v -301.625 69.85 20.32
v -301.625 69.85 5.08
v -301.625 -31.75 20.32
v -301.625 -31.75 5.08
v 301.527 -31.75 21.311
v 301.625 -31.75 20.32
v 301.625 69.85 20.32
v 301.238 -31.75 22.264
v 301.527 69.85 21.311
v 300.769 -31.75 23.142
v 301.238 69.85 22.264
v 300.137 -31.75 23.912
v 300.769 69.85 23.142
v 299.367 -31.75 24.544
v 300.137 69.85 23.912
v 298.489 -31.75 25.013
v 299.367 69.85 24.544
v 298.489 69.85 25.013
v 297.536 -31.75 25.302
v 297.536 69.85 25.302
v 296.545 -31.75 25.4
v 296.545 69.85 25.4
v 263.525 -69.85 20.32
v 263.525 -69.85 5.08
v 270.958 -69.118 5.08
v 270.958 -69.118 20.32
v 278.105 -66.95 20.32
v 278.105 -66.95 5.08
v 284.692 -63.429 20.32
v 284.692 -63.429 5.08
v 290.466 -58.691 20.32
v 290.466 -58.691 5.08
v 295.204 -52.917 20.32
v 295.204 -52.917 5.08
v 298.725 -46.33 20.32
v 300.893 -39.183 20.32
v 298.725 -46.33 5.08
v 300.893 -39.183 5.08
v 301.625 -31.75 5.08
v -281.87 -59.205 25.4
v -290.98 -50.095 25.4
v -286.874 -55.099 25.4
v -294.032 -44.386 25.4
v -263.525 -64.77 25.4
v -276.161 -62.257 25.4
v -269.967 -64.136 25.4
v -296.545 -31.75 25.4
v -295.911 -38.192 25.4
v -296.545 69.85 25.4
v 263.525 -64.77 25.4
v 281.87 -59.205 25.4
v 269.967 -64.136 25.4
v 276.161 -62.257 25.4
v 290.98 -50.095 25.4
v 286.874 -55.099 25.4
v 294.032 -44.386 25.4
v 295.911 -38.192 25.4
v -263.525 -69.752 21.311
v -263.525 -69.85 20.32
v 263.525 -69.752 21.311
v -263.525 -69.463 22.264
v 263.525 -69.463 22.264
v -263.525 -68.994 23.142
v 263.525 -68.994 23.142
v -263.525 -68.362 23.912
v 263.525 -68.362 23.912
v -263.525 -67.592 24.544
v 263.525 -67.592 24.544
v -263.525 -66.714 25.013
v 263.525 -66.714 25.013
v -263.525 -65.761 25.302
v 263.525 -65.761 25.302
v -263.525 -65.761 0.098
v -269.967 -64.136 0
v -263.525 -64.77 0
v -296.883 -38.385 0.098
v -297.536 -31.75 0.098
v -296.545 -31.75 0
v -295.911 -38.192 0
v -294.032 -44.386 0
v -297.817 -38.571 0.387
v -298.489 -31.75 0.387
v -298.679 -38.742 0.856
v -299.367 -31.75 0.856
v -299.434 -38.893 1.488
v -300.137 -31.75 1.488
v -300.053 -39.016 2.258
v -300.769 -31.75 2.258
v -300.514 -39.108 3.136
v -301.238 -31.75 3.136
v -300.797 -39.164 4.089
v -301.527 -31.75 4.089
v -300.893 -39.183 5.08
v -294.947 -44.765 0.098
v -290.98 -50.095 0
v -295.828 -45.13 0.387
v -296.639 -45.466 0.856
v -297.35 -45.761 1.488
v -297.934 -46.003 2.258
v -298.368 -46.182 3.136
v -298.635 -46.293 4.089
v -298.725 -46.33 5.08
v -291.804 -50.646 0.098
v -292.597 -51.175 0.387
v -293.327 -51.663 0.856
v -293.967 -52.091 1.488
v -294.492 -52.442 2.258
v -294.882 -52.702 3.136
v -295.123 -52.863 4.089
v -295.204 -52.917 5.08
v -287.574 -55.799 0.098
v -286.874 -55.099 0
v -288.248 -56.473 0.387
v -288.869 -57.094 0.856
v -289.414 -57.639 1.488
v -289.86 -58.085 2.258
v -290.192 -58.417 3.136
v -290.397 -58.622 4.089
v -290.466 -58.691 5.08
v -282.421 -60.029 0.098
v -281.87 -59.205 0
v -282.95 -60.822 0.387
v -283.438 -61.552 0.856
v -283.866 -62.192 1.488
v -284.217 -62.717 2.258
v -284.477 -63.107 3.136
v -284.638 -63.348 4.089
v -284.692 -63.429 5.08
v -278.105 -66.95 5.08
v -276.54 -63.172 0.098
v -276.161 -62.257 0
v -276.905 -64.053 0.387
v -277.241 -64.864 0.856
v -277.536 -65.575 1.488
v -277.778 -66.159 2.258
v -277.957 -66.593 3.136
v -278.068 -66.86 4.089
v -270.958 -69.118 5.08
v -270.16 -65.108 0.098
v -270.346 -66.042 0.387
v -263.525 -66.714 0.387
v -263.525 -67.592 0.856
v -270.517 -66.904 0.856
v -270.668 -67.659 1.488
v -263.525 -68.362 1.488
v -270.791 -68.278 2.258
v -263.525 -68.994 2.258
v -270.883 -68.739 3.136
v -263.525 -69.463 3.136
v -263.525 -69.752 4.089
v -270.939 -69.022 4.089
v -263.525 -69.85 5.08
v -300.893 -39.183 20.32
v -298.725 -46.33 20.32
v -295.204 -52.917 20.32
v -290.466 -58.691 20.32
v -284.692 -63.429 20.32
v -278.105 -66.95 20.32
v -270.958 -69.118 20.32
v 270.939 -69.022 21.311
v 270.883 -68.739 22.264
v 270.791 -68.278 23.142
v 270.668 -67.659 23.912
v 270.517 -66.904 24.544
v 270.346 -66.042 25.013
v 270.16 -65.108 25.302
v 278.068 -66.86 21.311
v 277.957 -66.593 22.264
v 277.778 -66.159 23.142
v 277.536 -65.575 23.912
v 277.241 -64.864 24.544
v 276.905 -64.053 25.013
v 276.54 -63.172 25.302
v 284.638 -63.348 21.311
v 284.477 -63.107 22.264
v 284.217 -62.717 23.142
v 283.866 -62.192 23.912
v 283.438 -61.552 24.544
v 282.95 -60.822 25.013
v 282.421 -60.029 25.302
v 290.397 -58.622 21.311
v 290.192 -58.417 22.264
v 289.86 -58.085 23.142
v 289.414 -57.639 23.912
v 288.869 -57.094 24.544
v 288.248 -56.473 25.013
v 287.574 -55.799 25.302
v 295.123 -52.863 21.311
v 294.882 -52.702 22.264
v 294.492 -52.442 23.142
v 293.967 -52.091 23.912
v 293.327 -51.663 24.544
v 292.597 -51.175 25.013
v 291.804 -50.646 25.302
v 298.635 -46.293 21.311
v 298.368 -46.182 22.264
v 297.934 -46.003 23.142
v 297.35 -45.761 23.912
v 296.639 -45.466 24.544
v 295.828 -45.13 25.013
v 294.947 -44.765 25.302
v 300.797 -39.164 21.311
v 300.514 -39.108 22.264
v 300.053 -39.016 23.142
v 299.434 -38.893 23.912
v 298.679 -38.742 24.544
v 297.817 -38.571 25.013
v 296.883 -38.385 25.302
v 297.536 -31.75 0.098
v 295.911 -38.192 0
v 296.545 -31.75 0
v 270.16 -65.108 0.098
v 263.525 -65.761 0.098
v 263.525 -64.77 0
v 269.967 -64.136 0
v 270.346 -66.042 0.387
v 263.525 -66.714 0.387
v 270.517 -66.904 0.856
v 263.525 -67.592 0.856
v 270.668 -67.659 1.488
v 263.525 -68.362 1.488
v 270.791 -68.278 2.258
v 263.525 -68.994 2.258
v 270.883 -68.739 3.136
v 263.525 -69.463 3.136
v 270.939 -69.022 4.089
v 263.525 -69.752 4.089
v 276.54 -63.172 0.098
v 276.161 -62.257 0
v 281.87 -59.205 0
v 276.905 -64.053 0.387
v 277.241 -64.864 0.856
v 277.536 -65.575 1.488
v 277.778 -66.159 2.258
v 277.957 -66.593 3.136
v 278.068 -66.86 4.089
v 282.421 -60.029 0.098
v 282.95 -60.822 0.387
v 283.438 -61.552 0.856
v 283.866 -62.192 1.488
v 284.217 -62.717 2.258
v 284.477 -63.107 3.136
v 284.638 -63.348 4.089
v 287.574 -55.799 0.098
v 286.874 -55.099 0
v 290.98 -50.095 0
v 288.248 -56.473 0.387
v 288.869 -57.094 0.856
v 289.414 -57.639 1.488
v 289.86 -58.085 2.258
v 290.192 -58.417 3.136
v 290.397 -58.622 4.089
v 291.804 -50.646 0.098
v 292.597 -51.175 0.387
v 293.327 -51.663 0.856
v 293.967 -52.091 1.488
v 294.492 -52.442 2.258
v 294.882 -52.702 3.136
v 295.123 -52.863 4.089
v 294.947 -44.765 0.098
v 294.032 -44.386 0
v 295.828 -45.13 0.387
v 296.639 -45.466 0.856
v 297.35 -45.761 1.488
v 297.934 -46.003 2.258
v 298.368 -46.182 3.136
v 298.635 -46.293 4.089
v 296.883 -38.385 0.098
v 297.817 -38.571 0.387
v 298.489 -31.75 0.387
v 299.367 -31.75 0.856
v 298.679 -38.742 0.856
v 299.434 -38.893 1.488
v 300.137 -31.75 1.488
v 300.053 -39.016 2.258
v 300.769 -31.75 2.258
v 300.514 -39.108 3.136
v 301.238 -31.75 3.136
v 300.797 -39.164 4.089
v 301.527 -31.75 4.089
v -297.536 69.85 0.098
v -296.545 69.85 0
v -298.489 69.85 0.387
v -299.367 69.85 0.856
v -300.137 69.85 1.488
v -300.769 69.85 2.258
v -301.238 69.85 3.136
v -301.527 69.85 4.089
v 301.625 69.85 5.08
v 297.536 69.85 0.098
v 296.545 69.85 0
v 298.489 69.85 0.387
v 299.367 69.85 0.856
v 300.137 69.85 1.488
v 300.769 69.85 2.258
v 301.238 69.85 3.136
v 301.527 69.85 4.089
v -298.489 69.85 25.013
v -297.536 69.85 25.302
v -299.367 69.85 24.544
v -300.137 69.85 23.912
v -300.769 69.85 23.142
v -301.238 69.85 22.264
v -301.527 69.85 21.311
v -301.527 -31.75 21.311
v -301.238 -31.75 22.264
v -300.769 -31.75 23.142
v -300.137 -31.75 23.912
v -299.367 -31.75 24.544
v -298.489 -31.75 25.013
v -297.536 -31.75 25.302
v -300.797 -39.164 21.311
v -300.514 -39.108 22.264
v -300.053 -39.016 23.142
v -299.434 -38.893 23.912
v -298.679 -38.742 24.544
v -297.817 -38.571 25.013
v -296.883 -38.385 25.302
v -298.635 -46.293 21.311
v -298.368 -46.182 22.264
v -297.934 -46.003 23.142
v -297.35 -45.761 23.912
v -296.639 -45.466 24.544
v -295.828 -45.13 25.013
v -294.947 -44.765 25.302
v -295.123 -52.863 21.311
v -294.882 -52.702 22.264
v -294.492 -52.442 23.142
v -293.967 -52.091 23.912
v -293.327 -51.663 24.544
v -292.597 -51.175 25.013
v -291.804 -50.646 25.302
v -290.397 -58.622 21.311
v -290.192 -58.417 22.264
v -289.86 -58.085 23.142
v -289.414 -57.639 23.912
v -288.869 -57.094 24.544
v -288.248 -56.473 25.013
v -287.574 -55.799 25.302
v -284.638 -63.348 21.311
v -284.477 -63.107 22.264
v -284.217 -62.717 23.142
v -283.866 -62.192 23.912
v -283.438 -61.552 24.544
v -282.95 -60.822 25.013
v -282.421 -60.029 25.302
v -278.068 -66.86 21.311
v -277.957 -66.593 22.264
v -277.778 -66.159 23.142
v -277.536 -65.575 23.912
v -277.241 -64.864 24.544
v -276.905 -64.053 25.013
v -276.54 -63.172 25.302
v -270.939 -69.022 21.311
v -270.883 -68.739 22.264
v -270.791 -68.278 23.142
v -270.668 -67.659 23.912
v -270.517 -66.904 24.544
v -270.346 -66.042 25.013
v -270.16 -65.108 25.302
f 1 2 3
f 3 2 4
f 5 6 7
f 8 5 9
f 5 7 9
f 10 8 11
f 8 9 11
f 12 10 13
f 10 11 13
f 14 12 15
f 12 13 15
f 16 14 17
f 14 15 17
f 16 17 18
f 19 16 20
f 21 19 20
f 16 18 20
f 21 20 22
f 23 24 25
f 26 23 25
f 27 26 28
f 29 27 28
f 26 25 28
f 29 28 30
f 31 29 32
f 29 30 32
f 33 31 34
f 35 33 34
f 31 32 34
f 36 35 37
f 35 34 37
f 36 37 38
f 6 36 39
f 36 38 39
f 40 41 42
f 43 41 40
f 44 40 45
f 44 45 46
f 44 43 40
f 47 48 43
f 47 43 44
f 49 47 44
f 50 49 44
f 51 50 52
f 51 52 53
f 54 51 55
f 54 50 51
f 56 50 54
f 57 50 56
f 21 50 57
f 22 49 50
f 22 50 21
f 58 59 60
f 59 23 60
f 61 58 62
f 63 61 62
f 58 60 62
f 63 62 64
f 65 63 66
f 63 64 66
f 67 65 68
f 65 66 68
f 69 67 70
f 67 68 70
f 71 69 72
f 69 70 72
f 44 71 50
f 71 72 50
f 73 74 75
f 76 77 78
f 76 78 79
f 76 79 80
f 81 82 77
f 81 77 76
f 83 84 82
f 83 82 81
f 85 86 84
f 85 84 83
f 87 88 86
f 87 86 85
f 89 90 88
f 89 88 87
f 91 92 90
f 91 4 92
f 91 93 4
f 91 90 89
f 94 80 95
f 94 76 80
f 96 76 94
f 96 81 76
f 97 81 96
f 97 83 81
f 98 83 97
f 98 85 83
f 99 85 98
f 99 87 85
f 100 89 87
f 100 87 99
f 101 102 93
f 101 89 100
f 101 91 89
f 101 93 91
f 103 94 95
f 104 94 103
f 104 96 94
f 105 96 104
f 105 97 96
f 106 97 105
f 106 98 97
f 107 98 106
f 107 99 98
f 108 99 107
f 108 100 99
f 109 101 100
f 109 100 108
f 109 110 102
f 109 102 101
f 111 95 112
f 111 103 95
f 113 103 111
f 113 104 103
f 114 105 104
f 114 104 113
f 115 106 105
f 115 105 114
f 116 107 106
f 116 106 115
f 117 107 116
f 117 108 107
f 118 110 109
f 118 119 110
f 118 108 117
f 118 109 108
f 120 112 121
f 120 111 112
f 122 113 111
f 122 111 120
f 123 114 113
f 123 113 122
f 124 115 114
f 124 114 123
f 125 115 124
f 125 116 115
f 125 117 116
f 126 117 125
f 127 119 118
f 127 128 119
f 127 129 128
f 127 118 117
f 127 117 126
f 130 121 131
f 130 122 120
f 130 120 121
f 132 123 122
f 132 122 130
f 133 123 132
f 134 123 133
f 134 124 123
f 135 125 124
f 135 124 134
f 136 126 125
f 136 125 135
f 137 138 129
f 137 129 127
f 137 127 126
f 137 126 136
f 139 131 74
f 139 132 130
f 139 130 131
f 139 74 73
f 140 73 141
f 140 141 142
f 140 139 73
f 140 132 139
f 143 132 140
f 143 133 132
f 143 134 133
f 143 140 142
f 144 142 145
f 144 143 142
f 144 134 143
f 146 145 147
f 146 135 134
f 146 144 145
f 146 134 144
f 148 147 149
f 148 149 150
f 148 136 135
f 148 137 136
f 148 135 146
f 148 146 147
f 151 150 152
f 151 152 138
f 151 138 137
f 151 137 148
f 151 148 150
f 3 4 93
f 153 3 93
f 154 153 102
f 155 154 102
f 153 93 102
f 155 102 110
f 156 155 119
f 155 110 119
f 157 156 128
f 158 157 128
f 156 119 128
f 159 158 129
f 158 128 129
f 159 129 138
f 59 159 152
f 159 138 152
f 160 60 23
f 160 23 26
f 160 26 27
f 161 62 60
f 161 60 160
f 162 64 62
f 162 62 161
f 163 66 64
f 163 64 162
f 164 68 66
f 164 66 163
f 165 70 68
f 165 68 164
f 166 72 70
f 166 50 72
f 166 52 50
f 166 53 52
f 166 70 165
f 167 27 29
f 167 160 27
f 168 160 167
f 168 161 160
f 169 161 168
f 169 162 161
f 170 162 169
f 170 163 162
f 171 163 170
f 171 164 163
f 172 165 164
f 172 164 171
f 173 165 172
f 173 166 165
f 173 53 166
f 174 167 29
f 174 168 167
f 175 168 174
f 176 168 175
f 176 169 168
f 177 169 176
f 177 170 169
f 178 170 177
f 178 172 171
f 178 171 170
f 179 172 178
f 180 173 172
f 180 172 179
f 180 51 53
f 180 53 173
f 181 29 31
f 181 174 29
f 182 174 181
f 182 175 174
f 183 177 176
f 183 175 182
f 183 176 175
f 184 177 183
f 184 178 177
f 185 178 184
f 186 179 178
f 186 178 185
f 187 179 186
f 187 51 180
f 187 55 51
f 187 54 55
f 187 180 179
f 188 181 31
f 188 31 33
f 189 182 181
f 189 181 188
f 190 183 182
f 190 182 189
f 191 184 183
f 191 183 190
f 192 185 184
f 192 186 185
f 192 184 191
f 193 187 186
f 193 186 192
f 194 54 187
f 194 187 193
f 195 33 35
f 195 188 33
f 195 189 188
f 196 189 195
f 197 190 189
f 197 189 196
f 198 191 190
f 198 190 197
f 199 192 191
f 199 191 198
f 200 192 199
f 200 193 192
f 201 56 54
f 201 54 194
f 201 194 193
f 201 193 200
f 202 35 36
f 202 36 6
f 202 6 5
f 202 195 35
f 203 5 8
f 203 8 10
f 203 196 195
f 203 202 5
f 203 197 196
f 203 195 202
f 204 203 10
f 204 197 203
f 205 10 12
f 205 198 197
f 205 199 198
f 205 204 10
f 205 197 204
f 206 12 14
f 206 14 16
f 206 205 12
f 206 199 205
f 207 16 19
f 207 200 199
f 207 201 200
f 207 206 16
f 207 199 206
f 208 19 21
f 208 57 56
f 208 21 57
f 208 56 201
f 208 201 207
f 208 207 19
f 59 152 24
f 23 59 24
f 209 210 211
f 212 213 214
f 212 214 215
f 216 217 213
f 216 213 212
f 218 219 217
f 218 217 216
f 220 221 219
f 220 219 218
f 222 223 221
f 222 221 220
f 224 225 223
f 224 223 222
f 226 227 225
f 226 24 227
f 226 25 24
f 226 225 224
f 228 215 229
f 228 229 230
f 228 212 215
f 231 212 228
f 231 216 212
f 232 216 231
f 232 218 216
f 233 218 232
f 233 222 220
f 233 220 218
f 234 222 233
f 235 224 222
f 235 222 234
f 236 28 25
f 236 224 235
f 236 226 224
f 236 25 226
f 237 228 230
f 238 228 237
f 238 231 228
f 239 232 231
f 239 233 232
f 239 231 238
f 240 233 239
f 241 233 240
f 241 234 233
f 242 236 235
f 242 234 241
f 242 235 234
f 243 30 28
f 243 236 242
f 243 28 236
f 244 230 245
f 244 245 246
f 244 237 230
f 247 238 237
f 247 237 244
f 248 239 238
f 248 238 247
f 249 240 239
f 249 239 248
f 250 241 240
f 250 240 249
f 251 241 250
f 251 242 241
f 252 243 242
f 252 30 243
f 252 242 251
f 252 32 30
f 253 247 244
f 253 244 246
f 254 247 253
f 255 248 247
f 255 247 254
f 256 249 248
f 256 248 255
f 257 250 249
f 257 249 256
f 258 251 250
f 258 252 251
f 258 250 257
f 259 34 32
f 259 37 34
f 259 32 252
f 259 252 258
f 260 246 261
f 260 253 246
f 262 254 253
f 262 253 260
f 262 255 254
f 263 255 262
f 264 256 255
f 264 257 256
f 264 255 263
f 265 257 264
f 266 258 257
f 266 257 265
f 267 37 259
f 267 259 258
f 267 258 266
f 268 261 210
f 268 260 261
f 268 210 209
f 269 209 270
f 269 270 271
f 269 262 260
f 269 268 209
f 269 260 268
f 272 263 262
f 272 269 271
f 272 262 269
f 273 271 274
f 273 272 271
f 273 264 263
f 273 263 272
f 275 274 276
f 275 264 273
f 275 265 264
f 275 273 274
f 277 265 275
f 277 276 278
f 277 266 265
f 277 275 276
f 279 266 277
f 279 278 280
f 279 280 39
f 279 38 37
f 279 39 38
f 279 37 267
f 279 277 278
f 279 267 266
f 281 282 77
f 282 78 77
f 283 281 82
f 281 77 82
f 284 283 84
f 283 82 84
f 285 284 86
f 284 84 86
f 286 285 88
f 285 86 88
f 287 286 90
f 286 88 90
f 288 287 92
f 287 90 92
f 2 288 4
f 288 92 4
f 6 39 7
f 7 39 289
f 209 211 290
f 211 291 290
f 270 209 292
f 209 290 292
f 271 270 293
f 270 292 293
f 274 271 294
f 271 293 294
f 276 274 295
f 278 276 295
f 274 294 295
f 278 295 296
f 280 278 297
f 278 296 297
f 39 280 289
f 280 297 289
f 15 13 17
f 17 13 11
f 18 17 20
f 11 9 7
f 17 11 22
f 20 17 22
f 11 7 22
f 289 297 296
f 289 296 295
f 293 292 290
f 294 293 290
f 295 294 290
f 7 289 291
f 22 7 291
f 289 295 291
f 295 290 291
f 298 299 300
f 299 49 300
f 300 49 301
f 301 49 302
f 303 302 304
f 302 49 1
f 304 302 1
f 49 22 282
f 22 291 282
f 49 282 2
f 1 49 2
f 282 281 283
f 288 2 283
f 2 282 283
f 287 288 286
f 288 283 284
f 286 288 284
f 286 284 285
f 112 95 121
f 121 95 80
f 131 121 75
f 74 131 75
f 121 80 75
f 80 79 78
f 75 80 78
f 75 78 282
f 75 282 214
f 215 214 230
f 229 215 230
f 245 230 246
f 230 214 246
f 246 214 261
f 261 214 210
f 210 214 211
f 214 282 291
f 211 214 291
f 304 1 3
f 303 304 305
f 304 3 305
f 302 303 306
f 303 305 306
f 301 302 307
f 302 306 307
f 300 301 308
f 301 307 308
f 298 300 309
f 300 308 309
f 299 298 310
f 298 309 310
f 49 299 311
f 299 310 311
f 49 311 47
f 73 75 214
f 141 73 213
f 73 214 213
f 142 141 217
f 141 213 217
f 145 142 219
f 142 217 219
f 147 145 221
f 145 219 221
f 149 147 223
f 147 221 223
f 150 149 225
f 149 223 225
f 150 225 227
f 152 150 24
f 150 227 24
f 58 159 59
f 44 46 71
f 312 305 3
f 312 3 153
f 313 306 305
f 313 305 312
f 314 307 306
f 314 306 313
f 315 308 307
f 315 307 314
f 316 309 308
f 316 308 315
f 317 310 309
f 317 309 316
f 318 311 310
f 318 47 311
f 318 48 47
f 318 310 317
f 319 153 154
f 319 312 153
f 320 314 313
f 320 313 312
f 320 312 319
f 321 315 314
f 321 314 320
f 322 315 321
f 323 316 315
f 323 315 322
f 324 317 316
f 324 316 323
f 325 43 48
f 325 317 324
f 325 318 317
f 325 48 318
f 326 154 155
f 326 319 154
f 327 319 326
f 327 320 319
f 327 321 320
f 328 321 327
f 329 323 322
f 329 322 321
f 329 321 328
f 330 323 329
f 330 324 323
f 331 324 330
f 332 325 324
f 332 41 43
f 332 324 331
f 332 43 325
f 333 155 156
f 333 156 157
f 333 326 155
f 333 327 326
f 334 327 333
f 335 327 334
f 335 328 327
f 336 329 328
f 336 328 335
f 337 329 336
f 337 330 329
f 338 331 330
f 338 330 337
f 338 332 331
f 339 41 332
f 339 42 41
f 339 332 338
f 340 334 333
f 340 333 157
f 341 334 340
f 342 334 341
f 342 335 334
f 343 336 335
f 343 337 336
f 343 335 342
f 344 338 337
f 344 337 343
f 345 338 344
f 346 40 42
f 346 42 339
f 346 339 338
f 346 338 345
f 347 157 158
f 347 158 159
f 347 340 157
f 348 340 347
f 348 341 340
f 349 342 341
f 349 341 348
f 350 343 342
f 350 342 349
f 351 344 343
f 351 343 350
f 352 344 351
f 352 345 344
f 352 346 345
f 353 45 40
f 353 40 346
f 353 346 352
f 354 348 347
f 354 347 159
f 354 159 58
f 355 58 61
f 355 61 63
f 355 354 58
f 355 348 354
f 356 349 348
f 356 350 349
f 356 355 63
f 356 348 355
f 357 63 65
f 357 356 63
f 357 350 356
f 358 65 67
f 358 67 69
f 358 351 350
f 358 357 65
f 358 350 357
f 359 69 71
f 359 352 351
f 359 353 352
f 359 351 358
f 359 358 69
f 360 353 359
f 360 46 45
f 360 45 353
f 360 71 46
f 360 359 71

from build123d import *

# Parameters (mm, degrees)
F1_DEPTH = 25.4
F2_R     = 5.08
F3_R     = 5.08


with BuildPart() as f1:
    # F0 (on Top) → F1 (new body)
    with BuildSketch(Plane.XY):
        with BuildLine():
            Line((301.625, -31.75), (301.625, 69.85))
            Line((301.625, 69.85), (-301.625, 69.85))
            Line((-301.625, 69.85), (-301.625, -31.75))
            ThreePointArc((-301.625, -31.75), (-290.465768, -58.690768), (-263.525, -69.85))
            Line((-263.525, -69.85), (263.525, -69.85))
            ThreePointArc((263.525, -69.85), (290.465768, -58.690768), (301.625, -31.75))
        make_face()
    extrude(amount=F1_DEPTH)

    # F2
    f2_edges = [f1.edges().sort_by_distance(p)[0] for p in [
        (0, -69.85, 25.4),
        (301.625, 19.05, 25.4),
        (-290.465768, -58.690768, 25.4),
        (-301.625, 19.05, 25.4),
        (290.465768, -58.690768, 25.4),
    ]]
    fillet(f2_edges, radius=F2_R)

    # F3
    f3_edges = [f1.edges().sort_by_distance(p)[0] for p in [
        (-301.625, 19.05, 0),
        (-290.465768, -58.690768, 0),
        (0, -69.85, 0),
        (290.465768, -58.690768, 0),
        (301.625, 19.05, 0),
    ]]
    fillet(f3_edges, radius=F3_R)


solid = f1.part
